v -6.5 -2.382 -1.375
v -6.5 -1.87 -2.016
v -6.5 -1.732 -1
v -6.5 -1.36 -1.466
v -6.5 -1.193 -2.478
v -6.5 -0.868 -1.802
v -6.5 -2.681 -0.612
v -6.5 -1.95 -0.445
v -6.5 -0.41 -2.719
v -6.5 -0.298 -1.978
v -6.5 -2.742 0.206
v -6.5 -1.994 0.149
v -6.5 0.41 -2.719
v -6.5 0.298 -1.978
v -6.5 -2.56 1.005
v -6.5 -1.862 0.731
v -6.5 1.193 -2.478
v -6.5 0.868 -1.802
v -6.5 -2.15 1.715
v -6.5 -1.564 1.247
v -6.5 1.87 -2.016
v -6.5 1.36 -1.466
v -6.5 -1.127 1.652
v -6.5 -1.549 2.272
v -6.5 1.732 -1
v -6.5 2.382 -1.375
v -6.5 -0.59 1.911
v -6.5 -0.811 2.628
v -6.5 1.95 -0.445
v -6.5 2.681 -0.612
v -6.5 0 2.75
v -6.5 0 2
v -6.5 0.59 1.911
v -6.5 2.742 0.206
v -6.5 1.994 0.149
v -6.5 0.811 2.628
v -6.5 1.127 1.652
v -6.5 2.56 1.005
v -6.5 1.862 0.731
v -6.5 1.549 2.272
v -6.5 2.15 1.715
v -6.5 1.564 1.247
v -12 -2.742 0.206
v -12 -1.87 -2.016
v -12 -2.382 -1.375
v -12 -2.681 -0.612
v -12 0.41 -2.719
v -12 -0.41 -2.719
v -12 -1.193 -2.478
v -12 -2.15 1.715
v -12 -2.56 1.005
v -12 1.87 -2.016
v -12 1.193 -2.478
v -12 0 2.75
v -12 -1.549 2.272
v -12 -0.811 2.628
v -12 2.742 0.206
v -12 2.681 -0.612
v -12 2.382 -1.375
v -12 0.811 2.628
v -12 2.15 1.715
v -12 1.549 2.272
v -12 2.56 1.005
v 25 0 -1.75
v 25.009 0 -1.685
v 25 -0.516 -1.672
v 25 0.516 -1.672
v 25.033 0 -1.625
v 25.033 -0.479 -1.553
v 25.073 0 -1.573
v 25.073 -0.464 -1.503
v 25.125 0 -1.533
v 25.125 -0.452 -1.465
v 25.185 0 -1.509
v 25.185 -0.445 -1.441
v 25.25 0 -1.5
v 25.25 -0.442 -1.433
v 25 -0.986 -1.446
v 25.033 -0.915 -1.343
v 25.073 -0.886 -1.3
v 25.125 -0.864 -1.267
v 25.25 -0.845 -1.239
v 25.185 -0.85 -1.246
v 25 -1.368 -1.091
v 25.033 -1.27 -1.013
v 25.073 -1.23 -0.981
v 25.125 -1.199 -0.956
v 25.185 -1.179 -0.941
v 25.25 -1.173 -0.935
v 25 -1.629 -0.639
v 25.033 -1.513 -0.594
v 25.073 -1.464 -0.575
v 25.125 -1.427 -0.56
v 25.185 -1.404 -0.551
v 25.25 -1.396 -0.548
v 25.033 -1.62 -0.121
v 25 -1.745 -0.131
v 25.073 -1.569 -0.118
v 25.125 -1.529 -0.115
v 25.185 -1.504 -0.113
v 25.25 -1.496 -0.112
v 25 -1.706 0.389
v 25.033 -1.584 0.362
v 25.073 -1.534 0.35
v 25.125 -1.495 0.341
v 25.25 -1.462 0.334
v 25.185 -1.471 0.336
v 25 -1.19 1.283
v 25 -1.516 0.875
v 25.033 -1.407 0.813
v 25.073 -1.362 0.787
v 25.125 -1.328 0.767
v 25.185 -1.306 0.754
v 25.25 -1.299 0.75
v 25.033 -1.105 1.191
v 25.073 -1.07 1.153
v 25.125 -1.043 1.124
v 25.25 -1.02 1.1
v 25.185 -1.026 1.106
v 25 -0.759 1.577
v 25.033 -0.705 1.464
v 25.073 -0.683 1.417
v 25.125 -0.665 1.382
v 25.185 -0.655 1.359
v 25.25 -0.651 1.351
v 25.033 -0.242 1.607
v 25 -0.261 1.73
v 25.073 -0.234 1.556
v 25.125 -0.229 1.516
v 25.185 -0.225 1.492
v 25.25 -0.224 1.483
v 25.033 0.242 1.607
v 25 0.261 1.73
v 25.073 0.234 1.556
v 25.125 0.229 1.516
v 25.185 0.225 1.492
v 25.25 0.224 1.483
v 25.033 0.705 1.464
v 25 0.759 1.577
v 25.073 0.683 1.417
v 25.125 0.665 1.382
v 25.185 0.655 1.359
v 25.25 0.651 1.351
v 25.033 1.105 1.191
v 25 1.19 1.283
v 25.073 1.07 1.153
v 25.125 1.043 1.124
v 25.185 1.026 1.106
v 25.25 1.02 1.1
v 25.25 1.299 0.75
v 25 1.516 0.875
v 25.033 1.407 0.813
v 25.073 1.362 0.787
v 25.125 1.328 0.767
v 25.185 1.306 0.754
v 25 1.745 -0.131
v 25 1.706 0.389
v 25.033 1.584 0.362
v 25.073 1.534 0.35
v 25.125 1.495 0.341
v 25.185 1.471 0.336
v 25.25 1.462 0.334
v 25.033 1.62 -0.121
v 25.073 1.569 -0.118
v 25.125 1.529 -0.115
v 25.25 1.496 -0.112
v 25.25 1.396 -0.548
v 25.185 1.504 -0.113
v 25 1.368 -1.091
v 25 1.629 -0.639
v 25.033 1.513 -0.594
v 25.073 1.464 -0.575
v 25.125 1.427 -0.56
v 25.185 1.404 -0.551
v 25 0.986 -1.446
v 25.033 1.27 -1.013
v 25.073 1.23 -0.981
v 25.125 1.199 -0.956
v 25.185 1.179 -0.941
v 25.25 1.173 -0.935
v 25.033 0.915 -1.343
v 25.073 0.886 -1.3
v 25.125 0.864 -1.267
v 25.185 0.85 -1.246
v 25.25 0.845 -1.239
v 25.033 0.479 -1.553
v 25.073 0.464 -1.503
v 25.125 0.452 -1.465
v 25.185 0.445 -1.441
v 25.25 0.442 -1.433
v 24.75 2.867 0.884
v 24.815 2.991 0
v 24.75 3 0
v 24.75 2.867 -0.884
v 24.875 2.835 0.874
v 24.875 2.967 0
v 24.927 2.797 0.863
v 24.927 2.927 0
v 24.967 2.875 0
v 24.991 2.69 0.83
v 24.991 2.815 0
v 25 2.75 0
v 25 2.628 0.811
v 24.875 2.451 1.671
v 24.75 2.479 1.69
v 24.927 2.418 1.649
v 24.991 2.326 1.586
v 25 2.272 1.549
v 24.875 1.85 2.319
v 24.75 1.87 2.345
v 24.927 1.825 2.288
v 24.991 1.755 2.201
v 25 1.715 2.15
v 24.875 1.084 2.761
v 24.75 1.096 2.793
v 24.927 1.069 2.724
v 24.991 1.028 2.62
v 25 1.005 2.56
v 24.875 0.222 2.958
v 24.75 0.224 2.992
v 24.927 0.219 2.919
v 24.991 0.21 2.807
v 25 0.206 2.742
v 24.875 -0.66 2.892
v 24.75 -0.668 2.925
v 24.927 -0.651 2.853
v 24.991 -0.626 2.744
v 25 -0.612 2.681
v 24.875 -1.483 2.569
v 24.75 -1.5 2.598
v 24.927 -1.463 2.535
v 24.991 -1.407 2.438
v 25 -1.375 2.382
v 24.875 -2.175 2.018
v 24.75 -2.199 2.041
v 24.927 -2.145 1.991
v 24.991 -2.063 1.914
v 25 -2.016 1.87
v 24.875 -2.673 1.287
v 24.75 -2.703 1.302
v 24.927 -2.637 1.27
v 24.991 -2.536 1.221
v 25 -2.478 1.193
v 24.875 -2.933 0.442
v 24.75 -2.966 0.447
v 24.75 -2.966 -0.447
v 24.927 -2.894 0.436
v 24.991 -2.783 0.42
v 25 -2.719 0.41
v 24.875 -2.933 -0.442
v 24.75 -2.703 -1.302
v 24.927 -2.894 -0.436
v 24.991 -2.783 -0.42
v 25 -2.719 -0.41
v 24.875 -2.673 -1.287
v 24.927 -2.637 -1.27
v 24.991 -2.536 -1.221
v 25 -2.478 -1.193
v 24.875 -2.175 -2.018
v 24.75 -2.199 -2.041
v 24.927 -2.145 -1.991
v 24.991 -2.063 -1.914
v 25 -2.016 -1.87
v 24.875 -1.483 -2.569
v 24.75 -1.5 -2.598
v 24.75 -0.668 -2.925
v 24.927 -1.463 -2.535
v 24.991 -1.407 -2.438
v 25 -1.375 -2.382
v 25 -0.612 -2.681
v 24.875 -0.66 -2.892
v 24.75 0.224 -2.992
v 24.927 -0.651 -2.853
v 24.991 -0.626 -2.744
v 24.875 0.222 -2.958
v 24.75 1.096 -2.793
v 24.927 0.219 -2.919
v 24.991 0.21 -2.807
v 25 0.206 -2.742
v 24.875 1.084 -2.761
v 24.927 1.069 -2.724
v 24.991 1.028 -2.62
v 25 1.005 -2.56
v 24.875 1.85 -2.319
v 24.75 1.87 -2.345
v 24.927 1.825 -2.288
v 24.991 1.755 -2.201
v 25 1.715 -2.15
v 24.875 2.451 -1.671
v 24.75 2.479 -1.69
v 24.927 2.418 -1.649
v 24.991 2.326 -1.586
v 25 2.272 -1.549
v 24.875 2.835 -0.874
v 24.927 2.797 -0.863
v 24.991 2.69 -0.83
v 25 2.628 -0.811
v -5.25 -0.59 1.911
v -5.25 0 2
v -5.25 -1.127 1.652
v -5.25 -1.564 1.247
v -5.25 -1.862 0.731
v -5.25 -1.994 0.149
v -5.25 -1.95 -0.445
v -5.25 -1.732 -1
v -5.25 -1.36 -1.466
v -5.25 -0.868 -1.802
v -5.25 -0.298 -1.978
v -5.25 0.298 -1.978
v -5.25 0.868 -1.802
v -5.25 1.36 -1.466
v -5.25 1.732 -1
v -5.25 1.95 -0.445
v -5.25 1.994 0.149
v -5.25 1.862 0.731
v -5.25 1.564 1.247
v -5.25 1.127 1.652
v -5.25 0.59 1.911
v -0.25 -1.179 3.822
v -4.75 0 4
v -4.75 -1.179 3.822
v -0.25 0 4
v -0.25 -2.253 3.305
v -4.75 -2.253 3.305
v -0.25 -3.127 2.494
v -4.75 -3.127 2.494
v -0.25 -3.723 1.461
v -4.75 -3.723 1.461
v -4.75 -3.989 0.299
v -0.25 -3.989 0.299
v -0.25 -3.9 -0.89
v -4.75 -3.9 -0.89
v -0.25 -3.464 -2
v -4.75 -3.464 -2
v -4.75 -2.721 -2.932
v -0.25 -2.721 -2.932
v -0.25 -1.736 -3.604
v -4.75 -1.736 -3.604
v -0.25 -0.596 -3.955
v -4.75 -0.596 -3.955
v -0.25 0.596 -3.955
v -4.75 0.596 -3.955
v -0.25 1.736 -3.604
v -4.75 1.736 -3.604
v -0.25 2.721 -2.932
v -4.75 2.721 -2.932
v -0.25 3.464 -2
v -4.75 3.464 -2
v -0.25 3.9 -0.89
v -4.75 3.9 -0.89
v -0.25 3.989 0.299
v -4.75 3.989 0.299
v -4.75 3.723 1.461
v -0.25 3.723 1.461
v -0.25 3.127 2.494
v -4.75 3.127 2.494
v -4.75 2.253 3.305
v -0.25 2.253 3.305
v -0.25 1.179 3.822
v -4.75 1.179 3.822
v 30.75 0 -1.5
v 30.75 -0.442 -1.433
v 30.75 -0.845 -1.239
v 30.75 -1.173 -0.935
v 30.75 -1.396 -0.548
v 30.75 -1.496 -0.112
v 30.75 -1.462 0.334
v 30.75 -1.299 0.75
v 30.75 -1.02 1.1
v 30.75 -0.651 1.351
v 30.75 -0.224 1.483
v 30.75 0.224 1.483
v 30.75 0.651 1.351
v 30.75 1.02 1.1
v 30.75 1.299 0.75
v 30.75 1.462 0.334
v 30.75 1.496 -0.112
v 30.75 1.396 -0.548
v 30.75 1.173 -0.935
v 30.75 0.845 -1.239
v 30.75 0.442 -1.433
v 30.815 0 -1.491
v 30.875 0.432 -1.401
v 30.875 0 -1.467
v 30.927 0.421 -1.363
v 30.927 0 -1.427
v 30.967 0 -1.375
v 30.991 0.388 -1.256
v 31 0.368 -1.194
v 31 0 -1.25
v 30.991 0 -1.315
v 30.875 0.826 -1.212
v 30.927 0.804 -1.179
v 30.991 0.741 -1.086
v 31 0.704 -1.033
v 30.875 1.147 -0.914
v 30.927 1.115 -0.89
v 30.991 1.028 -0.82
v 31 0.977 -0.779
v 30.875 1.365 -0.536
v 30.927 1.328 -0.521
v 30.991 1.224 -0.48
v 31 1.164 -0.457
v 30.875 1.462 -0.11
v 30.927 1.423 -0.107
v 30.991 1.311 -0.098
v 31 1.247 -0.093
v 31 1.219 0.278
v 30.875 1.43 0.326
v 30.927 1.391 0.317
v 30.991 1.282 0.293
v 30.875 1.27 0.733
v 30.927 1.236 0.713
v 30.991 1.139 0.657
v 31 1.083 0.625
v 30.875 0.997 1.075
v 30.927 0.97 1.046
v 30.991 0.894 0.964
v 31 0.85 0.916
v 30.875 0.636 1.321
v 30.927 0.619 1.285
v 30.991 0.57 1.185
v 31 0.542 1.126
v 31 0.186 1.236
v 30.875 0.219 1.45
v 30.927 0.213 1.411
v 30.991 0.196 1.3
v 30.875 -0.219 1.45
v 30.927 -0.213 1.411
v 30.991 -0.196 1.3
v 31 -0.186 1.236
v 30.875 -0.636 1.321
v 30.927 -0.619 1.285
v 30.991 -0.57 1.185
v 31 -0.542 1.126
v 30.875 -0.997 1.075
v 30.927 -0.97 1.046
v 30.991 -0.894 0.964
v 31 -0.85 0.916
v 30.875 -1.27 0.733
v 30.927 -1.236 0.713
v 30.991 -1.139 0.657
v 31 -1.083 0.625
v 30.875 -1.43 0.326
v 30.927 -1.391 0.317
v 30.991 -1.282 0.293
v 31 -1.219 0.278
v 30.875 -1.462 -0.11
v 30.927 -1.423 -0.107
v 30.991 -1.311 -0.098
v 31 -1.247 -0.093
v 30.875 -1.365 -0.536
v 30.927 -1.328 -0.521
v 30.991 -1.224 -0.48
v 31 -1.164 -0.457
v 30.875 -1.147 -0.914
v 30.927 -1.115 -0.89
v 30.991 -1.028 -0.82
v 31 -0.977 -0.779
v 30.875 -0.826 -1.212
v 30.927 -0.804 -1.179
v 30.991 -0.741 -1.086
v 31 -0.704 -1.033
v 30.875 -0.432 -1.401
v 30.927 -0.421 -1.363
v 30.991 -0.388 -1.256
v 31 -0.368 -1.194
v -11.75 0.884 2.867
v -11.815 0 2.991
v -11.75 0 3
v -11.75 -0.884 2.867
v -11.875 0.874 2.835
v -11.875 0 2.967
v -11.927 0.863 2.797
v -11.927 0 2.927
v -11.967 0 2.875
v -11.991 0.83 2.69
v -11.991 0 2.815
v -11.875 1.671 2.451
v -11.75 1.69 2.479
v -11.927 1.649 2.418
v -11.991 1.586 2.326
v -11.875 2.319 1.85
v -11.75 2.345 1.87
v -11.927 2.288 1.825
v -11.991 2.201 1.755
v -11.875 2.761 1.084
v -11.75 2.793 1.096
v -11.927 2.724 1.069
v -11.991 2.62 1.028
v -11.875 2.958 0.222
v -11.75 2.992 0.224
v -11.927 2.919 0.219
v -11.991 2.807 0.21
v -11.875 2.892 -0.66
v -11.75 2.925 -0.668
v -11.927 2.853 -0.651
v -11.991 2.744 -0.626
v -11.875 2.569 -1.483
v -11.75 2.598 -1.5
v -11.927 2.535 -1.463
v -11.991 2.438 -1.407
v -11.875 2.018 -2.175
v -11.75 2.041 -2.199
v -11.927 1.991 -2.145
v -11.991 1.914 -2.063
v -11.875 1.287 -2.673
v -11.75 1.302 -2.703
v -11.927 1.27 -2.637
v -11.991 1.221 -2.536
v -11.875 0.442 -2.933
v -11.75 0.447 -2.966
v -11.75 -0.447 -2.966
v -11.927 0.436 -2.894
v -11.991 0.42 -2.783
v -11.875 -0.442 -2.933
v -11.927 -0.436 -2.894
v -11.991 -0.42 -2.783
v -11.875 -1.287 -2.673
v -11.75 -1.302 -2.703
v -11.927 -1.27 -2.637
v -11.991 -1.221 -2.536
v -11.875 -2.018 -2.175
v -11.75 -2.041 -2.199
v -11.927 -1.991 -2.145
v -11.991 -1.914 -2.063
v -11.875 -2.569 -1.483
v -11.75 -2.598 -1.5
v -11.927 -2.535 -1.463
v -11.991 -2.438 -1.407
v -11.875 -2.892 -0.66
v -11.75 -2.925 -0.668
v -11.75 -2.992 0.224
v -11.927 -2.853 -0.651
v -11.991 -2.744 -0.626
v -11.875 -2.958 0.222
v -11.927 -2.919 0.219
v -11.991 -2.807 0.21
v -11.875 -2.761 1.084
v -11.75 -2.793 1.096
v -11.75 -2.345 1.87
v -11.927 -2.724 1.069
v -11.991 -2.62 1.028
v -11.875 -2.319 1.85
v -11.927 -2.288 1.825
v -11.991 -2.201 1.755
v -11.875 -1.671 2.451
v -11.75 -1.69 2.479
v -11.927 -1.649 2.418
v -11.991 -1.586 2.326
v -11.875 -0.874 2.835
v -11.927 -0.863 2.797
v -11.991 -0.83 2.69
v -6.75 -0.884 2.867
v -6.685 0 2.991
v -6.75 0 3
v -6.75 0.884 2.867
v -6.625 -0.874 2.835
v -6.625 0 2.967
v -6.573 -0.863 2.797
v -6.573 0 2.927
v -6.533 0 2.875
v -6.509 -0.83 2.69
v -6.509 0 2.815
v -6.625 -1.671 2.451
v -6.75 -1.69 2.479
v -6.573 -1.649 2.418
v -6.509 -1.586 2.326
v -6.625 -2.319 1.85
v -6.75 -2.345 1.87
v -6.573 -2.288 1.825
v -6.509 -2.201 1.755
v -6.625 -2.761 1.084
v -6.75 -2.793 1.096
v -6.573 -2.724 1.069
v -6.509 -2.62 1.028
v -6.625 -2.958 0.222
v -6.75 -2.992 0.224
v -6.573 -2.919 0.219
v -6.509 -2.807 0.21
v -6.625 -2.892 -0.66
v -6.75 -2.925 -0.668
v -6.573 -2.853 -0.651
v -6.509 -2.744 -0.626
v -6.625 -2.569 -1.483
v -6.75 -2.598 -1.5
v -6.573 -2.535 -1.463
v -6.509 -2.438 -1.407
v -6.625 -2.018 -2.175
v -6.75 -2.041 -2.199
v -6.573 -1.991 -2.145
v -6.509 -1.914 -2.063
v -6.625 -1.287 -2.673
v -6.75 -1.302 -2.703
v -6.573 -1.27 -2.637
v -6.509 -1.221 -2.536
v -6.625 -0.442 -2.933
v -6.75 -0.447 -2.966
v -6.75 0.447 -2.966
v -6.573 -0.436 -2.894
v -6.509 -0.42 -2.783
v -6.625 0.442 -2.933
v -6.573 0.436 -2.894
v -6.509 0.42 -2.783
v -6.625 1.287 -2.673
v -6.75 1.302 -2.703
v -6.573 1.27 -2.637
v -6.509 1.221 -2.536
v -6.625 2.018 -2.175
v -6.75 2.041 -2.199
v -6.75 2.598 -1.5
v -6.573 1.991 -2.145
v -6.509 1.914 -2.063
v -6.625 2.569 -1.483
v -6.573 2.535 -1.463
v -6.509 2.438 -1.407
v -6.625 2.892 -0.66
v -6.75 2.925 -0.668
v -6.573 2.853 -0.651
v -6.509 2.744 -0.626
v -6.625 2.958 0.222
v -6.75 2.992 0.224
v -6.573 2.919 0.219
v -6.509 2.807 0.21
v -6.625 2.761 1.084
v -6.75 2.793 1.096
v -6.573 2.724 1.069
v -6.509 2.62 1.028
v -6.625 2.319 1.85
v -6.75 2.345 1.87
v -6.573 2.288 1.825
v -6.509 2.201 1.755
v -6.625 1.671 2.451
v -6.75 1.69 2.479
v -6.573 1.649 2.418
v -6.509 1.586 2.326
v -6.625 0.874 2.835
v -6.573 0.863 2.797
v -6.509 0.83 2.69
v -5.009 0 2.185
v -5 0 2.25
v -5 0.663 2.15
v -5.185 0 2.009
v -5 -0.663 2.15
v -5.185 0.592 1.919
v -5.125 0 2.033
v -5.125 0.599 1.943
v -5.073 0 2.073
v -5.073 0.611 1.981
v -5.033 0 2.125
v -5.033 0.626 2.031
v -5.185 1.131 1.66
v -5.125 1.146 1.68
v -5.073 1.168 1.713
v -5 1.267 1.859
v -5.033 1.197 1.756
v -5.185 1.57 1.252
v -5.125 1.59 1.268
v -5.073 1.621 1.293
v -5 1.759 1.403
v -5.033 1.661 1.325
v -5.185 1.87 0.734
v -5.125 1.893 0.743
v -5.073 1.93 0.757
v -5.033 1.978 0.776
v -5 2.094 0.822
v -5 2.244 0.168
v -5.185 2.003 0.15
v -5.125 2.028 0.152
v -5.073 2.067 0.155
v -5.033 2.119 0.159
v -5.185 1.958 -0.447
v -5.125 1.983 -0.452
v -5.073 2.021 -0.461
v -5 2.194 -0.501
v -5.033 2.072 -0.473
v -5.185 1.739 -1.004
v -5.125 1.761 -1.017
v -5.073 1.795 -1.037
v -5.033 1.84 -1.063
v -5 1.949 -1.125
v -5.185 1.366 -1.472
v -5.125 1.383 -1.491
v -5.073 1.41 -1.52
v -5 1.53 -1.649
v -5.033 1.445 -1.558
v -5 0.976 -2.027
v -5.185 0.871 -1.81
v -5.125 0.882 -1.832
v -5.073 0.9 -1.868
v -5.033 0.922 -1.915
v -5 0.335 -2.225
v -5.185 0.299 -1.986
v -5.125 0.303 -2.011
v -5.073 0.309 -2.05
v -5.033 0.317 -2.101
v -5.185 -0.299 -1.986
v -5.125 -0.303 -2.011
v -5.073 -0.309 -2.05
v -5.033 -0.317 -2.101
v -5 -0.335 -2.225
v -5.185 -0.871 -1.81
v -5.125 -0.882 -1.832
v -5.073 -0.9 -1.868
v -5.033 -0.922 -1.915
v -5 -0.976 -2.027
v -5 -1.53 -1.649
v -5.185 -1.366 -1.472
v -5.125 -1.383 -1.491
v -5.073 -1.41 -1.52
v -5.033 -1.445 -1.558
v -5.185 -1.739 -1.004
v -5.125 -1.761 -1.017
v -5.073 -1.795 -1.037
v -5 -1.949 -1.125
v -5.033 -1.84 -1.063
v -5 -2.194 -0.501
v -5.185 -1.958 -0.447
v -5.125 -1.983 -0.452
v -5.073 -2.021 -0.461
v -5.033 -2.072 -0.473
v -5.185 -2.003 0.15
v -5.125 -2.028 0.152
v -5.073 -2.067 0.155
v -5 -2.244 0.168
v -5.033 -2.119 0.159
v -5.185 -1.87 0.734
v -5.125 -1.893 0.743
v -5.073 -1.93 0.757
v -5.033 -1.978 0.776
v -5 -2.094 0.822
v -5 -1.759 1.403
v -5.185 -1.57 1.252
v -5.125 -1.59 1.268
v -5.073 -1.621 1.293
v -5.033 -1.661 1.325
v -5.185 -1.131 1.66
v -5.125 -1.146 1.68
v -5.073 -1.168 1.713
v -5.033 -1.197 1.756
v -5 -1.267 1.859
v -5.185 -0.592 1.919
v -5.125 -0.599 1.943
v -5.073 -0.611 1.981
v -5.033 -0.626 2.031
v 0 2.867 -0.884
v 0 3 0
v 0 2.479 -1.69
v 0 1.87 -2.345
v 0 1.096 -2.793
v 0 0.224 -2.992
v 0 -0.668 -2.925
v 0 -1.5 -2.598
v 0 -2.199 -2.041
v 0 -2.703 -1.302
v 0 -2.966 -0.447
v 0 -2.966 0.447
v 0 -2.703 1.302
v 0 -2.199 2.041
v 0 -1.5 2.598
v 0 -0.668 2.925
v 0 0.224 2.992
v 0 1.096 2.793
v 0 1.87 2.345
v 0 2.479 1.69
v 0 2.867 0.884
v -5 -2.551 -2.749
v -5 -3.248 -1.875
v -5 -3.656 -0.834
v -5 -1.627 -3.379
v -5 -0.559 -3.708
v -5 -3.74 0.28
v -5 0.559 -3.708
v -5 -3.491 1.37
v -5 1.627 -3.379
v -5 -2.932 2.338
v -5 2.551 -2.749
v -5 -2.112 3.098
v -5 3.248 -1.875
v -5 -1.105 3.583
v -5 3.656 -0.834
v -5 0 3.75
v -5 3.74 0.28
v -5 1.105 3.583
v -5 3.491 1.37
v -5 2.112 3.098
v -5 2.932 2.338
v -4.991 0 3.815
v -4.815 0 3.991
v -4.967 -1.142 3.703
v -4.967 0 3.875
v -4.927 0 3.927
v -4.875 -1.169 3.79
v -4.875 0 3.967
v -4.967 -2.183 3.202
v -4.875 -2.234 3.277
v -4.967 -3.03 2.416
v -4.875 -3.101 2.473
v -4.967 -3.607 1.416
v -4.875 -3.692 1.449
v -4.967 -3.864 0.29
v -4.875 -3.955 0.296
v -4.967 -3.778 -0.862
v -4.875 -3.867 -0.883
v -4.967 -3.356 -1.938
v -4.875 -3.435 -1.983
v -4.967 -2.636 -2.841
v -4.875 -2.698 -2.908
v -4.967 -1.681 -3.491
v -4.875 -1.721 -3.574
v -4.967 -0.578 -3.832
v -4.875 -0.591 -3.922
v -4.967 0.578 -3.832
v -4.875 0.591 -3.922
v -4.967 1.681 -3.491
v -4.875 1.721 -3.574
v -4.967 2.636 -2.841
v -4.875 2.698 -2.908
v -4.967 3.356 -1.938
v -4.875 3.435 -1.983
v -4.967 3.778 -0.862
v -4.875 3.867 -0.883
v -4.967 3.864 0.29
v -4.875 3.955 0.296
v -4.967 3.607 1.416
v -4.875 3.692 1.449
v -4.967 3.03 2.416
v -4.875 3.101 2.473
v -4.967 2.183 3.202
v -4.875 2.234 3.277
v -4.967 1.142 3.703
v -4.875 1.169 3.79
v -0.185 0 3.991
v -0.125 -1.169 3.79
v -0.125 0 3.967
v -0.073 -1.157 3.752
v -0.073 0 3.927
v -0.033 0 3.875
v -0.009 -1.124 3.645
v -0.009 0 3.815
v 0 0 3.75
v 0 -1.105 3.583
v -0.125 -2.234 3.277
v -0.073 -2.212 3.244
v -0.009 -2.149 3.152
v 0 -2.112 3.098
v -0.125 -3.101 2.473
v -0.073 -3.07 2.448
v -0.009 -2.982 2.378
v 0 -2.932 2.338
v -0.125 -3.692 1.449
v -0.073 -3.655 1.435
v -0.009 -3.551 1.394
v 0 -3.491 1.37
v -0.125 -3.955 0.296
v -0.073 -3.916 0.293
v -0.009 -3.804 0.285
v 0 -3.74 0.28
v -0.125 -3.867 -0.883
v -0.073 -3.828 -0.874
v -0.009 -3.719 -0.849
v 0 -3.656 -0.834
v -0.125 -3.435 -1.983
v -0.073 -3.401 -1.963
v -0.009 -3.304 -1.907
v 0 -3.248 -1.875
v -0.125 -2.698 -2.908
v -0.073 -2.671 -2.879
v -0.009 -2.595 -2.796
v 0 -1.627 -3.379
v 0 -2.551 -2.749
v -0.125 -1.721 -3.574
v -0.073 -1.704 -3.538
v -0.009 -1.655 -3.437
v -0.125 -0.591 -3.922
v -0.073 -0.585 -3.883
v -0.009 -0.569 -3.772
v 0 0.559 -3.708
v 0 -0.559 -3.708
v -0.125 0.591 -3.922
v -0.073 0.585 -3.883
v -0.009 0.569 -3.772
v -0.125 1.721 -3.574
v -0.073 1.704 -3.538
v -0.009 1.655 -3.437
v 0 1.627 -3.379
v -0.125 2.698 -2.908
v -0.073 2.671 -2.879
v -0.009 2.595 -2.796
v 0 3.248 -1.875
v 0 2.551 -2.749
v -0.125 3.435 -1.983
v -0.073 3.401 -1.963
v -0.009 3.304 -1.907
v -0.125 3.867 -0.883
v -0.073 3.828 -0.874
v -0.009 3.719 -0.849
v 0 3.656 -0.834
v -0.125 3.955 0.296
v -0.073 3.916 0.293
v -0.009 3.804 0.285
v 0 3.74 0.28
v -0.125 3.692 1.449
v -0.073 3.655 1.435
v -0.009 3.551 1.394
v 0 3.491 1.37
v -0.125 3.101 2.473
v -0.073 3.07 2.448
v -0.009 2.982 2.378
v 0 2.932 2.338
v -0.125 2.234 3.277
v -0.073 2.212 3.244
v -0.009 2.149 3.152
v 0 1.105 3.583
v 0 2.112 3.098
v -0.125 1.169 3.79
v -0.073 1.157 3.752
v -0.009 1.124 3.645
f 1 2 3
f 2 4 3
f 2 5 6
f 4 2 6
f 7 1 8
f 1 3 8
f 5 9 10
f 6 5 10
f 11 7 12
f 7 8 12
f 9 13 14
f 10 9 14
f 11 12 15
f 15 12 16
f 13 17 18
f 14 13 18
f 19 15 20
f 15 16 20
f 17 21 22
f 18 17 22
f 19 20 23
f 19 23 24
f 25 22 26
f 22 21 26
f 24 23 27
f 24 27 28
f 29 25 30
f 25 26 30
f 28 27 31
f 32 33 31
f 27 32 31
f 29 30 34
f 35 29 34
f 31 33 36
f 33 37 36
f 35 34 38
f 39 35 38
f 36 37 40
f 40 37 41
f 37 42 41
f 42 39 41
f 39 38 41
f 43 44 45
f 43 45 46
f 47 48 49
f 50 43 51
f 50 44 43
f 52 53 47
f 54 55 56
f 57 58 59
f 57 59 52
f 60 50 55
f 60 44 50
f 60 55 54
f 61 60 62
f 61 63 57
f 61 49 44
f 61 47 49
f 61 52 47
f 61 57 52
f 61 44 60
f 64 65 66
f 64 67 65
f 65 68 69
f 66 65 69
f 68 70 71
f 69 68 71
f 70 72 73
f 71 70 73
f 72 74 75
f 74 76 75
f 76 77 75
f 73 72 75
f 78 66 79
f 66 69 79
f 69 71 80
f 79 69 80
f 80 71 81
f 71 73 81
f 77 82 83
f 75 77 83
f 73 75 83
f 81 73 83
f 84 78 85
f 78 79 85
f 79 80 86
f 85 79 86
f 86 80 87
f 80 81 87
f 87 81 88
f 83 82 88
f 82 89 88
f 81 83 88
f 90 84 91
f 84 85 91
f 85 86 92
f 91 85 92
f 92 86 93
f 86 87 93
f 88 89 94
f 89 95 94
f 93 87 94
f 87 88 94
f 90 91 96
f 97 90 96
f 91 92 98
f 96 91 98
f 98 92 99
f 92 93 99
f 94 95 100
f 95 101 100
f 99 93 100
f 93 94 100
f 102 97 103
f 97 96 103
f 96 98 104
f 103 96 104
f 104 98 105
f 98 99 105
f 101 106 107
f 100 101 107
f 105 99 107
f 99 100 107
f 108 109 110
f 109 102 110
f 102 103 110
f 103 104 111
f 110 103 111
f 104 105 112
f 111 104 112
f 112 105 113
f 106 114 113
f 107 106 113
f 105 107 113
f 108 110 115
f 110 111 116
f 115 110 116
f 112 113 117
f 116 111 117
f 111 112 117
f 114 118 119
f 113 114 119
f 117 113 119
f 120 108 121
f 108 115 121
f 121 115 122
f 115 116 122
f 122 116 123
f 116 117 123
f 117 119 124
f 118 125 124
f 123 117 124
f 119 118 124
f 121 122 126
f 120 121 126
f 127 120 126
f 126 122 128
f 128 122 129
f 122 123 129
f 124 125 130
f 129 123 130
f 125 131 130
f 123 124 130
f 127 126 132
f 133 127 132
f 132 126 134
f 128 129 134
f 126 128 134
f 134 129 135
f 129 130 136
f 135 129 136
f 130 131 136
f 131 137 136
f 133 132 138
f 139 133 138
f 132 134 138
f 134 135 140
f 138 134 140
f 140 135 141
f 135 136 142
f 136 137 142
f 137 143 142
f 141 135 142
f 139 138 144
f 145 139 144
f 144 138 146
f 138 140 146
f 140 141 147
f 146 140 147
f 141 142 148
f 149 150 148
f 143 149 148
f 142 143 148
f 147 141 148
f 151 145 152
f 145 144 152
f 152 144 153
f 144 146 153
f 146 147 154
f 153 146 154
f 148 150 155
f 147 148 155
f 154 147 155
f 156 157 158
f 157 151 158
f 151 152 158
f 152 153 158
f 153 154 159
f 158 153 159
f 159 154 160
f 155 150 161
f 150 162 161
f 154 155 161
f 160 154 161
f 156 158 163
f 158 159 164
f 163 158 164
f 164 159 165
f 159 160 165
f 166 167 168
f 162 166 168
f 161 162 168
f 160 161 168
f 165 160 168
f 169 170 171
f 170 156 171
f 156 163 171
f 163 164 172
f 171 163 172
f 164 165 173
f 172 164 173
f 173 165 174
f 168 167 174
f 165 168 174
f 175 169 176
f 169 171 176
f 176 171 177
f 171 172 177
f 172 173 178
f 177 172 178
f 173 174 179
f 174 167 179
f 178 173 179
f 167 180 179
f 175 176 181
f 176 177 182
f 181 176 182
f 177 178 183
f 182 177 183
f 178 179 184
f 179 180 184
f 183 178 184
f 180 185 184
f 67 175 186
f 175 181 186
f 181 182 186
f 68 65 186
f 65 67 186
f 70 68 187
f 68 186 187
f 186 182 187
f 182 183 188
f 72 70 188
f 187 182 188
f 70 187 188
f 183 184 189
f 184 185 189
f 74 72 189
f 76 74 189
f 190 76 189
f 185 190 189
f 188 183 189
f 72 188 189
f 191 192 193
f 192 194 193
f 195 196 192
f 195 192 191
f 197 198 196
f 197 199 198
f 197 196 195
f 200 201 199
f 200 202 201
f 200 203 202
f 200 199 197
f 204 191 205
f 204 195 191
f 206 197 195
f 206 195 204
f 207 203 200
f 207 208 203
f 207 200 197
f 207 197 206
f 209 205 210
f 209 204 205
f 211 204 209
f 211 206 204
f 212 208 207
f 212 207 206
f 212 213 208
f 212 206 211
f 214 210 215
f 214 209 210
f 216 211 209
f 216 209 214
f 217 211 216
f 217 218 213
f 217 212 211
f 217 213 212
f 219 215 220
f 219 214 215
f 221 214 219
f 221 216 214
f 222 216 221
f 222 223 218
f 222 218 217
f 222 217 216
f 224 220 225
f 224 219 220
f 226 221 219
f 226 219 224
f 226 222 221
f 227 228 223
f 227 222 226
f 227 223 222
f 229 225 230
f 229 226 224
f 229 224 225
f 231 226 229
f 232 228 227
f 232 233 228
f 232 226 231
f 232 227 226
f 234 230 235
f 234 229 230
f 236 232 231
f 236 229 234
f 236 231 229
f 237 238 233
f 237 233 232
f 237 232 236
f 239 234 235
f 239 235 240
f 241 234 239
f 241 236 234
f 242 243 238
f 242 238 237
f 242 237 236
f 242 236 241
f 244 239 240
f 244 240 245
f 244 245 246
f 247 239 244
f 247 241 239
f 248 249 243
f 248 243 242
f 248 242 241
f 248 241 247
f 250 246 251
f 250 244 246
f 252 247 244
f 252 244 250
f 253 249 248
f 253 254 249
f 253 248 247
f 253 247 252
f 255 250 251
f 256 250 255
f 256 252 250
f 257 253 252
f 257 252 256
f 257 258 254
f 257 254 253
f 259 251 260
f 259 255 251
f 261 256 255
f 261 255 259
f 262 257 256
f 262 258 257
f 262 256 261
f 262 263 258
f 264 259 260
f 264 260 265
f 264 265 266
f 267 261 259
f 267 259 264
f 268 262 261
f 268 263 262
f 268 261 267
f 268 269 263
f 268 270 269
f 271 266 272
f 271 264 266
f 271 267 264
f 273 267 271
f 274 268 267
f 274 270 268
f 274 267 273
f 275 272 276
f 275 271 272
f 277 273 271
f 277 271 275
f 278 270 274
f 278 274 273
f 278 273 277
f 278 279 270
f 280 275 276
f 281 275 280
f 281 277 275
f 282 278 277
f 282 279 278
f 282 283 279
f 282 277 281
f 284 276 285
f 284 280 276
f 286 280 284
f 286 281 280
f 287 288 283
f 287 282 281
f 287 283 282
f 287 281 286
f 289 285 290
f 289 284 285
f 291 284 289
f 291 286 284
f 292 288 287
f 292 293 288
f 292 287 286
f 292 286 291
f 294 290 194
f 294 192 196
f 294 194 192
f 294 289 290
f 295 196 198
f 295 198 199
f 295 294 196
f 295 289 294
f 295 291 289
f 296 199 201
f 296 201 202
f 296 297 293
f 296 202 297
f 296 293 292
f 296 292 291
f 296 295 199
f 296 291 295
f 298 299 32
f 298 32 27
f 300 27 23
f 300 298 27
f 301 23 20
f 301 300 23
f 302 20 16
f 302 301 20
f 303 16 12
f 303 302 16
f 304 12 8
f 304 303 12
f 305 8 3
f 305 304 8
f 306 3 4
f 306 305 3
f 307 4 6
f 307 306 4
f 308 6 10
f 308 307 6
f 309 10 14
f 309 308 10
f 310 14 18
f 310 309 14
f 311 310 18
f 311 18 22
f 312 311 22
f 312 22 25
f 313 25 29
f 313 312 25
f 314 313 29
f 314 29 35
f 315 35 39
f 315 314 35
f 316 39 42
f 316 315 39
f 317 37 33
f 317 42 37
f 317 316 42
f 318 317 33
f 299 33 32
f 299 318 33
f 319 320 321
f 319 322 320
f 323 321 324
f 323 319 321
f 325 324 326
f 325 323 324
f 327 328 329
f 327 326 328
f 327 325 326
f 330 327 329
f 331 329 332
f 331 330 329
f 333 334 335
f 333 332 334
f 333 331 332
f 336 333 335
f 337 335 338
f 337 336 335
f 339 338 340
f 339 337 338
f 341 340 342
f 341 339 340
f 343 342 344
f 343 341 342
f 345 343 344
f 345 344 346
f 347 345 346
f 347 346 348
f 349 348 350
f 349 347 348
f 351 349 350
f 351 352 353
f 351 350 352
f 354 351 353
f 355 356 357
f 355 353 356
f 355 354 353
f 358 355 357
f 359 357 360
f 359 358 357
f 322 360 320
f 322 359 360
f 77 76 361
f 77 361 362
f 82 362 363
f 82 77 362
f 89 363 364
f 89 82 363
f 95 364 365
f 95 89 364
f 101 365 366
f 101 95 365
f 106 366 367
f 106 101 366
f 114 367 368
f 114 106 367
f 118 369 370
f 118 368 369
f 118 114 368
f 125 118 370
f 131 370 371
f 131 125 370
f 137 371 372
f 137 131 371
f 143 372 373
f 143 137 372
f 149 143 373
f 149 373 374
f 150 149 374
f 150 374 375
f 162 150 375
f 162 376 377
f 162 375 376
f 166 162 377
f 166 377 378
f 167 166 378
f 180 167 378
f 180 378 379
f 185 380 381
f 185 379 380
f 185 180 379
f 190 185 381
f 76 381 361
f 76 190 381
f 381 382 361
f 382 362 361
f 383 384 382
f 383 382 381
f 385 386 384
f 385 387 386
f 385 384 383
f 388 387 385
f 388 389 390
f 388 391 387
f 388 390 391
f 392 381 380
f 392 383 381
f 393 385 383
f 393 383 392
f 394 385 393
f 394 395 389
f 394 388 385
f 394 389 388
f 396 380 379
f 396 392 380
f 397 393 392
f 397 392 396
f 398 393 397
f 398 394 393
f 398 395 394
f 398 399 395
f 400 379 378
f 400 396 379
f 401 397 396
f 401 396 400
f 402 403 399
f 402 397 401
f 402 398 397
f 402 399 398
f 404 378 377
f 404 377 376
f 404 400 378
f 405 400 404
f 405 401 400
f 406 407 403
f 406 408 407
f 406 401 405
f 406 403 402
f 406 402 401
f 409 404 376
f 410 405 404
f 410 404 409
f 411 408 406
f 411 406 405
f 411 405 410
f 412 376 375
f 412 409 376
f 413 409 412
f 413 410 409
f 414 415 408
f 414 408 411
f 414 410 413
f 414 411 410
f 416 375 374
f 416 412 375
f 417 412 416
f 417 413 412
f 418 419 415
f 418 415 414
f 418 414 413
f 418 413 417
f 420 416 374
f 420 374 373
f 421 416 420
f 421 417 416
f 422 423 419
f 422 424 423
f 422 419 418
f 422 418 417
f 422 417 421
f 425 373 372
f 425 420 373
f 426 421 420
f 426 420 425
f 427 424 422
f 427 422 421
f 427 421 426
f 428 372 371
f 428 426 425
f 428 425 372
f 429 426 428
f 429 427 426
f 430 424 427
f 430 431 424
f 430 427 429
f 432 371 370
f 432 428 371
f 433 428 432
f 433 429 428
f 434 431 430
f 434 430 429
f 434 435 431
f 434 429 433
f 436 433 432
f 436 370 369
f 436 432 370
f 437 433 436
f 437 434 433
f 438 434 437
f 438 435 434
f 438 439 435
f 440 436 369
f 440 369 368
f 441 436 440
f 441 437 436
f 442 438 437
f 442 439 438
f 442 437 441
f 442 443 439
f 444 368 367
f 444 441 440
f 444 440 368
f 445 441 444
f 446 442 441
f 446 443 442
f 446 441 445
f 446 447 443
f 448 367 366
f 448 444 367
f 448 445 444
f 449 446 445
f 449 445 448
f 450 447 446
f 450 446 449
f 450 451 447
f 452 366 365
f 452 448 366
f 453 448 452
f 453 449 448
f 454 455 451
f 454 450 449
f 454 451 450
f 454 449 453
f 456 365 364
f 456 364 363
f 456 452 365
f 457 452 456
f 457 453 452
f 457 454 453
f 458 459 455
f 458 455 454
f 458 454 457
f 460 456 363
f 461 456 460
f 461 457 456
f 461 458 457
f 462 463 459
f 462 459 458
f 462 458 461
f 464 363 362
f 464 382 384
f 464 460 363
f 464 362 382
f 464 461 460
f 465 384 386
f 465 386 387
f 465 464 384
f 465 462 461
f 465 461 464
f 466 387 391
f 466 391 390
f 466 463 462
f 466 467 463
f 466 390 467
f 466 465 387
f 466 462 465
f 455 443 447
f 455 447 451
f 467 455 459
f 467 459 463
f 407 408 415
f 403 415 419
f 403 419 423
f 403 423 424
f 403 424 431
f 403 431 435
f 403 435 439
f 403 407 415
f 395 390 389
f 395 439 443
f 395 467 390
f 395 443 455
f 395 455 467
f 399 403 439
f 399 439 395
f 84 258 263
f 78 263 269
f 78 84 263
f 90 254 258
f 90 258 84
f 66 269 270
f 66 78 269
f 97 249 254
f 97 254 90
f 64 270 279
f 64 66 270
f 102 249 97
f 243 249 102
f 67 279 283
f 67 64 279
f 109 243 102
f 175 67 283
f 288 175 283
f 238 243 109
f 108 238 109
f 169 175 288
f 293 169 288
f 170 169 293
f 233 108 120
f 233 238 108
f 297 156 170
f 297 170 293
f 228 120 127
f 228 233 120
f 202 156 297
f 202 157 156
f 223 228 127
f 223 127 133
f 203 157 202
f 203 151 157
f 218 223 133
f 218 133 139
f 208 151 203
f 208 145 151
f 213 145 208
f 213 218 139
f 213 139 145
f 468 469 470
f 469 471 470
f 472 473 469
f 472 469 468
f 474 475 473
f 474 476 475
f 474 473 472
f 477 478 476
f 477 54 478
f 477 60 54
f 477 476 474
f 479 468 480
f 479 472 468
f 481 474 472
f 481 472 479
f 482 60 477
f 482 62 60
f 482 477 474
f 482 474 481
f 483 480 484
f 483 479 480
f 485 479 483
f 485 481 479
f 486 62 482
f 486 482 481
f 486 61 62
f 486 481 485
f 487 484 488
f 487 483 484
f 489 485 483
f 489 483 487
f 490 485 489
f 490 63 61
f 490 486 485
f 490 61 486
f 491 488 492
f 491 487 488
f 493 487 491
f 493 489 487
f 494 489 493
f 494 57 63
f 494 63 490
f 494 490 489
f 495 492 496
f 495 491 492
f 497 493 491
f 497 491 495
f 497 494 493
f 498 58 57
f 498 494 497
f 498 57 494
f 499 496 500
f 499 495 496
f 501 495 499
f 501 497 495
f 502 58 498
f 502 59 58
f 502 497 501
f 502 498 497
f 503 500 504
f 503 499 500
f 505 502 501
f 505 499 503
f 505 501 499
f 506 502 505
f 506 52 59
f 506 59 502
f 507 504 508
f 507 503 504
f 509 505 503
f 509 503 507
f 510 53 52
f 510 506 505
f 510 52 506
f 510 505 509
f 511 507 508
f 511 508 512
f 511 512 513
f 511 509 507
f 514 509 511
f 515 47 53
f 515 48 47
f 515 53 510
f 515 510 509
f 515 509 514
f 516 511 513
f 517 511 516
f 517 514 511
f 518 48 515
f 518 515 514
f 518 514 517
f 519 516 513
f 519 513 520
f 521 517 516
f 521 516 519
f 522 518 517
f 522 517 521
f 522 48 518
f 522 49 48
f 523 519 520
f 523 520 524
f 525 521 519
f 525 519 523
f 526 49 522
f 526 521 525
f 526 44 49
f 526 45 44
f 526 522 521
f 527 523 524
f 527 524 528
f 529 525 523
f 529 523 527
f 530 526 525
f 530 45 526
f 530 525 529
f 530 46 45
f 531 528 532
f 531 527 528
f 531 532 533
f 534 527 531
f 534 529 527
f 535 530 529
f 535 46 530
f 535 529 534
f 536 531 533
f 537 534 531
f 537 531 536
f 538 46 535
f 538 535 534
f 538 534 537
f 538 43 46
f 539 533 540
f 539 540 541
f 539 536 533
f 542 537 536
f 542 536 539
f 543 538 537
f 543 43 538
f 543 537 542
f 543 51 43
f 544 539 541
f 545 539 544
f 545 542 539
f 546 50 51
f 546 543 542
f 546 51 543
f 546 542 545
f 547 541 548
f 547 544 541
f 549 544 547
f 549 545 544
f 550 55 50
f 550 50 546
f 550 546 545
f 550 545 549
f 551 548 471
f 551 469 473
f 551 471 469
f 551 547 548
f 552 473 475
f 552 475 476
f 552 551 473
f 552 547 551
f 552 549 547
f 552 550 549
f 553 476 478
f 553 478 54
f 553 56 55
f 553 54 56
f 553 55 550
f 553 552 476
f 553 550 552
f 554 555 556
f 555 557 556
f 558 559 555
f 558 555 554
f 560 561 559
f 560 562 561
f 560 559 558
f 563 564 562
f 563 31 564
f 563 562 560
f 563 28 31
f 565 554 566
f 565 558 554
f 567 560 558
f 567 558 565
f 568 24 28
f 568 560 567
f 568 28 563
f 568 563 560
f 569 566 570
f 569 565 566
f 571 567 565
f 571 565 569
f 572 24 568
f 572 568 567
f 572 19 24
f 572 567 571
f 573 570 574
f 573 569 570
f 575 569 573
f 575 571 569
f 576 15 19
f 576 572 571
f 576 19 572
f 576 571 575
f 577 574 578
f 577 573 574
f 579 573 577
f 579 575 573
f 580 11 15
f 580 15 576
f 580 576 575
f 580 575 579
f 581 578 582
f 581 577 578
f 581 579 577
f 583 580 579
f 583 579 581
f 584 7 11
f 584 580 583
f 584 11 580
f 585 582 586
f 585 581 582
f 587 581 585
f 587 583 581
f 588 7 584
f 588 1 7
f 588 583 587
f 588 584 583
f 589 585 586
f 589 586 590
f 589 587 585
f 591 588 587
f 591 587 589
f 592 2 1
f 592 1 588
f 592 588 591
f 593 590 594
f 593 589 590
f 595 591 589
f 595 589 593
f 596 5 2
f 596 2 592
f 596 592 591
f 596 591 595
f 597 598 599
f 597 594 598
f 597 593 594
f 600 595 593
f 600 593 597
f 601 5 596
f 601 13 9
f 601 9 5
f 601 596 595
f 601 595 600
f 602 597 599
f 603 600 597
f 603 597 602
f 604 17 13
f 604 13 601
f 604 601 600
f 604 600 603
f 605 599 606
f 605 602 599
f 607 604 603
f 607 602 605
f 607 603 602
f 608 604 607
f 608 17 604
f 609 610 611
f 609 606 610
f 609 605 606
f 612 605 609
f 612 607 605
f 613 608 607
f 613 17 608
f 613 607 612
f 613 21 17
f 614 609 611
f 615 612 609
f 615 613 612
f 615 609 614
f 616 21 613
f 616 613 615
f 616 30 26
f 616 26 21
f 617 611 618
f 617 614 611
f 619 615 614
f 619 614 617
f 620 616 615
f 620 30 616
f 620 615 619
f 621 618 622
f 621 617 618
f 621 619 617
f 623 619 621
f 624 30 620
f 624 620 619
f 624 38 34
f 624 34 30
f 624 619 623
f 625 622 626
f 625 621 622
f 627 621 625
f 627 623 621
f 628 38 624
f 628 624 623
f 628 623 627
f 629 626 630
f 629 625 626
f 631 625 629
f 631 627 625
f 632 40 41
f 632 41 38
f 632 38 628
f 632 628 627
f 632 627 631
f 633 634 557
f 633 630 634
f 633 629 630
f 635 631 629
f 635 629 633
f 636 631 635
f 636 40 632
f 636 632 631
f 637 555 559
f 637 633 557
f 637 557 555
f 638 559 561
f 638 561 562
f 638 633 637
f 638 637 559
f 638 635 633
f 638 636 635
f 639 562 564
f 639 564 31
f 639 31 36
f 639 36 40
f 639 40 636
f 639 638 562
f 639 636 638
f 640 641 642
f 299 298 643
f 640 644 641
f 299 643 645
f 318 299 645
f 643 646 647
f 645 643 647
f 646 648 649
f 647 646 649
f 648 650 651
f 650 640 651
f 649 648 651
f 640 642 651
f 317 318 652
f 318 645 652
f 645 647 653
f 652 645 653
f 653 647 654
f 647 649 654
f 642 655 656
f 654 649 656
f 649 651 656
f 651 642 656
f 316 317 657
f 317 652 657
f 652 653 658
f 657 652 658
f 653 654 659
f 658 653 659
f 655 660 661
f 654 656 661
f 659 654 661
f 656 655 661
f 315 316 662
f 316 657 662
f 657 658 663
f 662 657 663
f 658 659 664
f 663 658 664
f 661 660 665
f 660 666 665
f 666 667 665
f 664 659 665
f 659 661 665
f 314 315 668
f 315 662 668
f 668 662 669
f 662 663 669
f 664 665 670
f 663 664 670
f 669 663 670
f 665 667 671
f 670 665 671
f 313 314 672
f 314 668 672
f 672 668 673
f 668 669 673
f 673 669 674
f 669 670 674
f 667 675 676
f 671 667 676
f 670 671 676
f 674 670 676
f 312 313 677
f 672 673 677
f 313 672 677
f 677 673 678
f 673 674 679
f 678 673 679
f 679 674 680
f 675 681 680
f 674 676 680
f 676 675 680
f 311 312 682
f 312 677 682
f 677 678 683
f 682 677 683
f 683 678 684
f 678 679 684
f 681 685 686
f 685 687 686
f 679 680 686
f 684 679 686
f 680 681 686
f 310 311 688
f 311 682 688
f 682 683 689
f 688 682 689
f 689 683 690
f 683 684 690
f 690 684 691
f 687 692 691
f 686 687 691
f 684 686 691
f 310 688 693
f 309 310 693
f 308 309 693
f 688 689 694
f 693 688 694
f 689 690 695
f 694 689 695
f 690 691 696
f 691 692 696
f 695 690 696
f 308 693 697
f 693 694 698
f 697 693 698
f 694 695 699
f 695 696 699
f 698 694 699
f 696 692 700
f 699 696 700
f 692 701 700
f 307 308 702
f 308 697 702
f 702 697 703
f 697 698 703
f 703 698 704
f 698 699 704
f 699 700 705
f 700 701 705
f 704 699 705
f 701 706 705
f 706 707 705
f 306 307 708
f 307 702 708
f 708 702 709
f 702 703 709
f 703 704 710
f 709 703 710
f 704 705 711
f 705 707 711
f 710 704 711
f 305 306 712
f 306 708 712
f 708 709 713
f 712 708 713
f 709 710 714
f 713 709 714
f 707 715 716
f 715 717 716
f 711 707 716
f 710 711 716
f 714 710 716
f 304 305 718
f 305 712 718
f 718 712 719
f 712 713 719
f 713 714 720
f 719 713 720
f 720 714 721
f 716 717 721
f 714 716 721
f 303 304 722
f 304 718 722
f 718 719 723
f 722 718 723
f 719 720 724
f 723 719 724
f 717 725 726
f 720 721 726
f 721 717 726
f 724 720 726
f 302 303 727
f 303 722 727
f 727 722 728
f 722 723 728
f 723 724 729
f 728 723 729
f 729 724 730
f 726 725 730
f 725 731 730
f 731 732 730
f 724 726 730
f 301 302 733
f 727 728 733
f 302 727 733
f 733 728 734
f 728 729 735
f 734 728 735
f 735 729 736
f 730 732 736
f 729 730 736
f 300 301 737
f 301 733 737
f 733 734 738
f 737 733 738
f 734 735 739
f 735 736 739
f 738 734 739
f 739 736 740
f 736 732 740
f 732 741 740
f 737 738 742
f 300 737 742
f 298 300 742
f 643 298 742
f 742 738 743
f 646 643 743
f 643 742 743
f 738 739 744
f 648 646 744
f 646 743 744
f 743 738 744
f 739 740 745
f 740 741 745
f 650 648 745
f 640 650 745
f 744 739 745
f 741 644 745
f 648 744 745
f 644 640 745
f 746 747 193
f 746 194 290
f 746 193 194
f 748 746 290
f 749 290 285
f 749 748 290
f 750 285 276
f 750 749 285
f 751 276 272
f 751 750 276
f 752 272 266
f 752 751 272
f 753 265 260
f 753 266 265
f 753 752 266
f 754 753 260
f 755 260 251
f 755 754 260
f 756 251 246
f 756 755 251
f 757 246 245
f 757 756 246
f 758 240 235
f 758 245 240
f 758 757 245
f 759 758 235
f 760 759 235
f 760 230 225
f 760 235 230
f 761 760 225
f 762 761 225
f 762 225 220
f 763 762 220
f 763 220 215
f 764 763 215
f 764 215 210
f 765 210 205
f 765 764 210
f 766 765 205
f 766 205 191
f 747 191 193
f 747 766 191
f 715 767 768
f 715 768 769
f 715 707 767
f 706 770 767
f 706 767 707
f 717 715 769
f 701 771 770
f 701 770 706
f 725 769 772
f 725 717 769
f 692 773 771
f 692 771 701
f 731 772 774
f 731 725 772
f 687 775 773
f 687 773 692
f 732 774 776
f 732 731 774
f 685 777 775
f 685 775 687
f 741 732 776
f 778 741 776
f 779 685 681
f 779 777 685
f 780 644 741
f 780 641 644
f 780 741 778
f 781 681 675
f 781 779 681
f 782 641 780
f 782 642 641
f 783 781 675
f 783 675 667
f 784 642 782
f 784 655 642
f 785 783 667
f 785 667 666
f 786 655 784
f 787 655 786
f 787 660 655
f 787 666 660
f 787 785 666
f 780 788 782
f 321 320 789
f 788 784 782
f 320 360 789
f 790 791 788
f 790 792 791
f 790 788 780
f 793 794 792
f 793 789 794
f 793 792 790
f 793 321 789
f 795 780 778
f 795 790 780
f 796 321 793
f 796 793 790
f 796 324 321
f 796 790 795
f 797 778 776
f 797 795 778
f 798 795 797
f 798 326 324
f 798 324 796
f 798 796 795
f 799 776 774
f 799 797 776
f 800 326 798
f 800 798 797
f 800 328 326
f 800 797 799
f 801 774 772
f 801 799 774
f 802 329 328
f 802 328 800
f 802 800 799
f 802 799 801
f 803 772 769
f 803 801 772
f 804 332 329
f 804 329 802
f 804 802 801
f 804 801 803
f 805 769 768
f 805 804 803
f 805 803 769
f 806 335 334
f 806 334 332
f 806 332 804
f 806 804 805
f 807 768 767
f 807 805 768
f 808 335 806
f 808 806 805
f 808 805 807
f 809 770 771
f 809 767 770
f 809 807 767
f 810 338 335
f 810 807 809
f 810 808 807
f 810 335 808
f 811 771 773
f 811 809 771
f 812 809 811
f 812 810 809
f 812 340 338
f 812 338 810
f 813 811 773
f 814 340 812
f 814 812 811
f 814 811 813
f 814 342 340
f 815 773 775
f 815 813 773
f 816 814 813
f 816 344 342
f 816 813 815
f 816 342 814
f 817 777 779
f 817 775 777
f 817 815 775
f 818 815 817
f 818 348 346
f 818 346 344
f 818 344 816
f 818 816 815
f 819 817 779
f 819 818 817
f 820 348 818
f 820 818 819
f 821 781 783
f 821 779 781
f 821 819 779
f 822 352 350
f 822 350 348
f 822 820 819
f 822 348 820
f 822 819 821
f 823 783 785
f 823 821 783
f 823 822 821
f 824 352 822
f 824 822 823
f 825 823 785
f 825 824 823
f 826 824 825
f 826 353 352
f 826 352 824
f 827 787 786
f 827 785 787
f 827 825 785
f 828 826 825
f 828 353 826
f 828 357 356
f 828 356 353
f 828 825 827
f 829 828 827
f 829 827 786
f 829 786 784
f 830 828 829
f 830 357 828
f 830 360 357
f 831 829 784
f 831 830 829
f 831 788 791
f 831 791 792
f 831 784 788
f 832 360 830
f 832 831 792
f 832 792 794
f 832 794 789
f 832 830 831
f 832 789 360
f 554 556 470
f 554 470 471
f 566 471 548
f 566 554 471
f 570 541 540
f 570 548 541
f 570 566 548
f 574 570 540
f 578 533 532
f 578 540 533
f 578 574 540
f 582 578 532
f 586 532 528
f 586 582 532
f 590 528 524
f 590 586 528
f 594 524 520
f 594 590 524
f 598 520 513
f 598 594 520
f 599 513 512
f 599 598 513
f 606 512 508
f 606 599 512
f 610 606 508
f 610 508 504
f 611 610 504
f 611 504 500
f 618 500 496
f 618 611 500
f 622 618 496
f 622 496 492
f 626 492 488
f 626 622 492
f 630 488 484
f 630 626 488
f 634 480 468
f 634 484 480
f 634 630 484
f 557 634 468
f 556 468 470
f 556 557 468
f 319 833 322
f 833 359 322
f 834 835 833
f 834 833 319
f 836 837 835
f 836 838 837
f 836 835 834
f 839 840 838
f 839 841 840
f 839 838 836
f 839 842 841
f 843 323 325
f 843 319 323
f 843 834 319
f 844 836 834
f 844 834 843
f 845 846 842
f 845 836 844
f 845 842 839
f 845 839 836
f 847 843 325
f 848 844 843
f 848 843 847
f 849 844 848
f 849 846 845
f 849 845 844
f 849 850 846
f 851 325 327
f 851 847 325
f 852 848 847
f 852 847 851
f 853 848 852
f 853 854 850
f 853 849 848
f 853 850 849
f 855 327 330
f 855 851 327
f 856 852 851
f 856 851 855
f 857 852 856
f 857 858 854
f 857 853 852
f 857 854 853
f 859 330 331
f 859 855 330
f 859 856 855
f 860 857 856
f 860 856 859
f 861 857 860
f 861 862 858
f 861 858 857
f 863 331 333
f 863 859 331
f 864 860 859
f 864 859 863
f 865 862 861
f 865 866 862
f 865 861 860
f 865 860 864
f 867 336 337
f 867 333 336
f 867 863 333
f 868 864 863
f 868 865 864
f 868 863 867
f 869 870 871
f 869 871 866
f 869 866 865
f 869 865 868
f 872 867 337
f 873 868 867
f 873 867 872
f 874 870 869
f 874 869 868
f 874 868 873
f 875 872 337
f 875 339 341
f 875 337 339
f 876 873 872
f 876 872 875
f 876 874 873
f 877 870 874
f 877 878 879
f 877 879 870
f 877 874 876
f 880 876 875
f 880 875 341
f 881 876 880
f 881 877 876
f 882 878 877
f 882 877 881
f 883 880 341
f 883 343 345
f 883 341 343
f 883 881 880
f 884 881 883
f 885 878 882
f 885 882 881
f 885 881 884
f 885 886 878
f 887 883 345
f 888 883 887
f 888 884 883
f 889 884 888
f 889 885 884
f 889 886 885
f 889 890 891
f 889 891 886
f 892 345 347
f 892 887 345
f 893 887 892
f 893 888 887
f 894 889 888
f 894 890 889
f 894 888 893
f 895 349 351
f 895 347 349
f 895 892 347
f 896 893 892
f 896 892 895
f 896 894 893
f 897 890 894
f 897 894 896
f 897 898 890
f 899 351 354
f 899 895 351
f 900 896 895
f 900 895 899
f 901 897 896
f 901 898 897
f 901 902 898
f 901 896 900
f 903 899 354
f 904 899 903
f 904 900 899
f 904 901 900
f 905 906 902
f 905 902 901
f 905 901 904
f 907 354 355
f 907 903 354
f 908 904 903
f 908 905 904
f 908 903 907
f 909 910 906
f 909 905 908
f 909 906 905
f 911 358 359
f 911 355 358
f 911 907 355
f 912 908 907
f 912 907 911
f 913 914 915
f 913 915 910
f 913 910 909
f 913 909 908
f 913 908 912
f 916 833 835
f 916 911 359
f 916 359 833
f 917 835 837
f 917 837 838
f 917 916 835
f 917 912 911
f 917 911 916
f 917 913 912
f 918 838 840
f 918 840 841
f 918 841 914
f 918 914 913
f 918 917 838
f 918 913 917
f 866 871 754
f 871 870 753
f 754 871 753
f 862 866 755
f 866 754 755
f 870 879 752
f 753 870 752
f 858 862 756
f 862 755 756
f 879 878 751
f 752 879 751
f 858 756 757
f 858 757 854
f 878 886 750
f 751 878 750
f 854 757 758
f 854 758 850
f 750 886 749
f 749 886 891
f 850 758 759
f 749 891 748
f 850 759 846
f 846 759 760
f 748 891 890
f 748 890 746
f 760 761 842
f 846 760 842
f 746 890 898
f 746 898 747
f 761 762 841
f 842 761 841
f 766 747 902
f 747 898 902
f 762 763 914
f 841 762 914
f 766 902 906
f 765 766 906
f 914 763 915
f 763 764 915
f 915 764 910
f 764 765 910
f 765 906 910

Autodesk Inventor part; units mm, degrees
ref_plane "YZ Plane" through (0, 0, 0) normal (1, 0, 0) x (0, 1, 0)
ref_plane "XZ Plane" through (0, 0, 0) normal (0, 1, 0) x (-1, 0, 0)
ref_plane "XY Plane" through (0, 0, 0) normal (0, 0, 1) x (1, 0, 0)
sketch "Sketch1" plane through (0, 0, 0) normal (1, 0, 0) x (0, 1, 0)
  circle A0 centre (0, 0) radius 3
  dimension "d0" = 6
extrude "Extrusion1" add sketch "Sketch1" along normal blind 25
sketch "Sketch2" plane through (25, 0, 0) normal (1, 0, 0) x (0, 0, -1)
  circle A0 centre (0, 0) radius 1.5
  dimension "d3" = 3
extrude "Extrusion2" add sketch "Sketch2" along normal blind 6
sketch "Sketch3" plane through (0, 0, 0) normal (-1, 0, 0) x (0, 0, 1)
  circle A0 centre (0, 0) radius 4
  dimension "d6" = 8
extrude "Extrusion3" add sketch "Sketch3" along normal blind 5
sketch "Sketch4" plane through (-5, 0, 0) normal (-1, 0, 0) x (0, 0, 1)
  circle A0 centre (0, 0) radius 2
  dimension "d9" = 4
extrude "Extrusion4" add sketch "Sketch4" along normal blind 1.5
sketch "Sketch5" plane through (-6.5, 0, 0) normal (-1, 0, 0) x (0, 0, 1)
  circle A0 centre (0, 0) radius 3
  dimension "d12" = 6
extrude "Extrusion5" add sketch "Sketch5" along normal blind 5.5
thread "Thread1" size "M6x1" class "6g" standard "ANSI Metric M Profile" full length
thread "Thread2" size "M3x0.5" class "6g" standard "ANSI Metric M Profile" full length
fillet "Fillet1" radius 0.25 8 edges at (-12, 0, -3) (-6.5, 0, -3) (-5, 0, -4) (0, 0, -4) (25, -3, 0) (31, 0, 1.5) (25, 0, 1.5) (-5, 0, -2)
properties part number "Reverse Lever Ring Stud" material "Steel, Mild"
